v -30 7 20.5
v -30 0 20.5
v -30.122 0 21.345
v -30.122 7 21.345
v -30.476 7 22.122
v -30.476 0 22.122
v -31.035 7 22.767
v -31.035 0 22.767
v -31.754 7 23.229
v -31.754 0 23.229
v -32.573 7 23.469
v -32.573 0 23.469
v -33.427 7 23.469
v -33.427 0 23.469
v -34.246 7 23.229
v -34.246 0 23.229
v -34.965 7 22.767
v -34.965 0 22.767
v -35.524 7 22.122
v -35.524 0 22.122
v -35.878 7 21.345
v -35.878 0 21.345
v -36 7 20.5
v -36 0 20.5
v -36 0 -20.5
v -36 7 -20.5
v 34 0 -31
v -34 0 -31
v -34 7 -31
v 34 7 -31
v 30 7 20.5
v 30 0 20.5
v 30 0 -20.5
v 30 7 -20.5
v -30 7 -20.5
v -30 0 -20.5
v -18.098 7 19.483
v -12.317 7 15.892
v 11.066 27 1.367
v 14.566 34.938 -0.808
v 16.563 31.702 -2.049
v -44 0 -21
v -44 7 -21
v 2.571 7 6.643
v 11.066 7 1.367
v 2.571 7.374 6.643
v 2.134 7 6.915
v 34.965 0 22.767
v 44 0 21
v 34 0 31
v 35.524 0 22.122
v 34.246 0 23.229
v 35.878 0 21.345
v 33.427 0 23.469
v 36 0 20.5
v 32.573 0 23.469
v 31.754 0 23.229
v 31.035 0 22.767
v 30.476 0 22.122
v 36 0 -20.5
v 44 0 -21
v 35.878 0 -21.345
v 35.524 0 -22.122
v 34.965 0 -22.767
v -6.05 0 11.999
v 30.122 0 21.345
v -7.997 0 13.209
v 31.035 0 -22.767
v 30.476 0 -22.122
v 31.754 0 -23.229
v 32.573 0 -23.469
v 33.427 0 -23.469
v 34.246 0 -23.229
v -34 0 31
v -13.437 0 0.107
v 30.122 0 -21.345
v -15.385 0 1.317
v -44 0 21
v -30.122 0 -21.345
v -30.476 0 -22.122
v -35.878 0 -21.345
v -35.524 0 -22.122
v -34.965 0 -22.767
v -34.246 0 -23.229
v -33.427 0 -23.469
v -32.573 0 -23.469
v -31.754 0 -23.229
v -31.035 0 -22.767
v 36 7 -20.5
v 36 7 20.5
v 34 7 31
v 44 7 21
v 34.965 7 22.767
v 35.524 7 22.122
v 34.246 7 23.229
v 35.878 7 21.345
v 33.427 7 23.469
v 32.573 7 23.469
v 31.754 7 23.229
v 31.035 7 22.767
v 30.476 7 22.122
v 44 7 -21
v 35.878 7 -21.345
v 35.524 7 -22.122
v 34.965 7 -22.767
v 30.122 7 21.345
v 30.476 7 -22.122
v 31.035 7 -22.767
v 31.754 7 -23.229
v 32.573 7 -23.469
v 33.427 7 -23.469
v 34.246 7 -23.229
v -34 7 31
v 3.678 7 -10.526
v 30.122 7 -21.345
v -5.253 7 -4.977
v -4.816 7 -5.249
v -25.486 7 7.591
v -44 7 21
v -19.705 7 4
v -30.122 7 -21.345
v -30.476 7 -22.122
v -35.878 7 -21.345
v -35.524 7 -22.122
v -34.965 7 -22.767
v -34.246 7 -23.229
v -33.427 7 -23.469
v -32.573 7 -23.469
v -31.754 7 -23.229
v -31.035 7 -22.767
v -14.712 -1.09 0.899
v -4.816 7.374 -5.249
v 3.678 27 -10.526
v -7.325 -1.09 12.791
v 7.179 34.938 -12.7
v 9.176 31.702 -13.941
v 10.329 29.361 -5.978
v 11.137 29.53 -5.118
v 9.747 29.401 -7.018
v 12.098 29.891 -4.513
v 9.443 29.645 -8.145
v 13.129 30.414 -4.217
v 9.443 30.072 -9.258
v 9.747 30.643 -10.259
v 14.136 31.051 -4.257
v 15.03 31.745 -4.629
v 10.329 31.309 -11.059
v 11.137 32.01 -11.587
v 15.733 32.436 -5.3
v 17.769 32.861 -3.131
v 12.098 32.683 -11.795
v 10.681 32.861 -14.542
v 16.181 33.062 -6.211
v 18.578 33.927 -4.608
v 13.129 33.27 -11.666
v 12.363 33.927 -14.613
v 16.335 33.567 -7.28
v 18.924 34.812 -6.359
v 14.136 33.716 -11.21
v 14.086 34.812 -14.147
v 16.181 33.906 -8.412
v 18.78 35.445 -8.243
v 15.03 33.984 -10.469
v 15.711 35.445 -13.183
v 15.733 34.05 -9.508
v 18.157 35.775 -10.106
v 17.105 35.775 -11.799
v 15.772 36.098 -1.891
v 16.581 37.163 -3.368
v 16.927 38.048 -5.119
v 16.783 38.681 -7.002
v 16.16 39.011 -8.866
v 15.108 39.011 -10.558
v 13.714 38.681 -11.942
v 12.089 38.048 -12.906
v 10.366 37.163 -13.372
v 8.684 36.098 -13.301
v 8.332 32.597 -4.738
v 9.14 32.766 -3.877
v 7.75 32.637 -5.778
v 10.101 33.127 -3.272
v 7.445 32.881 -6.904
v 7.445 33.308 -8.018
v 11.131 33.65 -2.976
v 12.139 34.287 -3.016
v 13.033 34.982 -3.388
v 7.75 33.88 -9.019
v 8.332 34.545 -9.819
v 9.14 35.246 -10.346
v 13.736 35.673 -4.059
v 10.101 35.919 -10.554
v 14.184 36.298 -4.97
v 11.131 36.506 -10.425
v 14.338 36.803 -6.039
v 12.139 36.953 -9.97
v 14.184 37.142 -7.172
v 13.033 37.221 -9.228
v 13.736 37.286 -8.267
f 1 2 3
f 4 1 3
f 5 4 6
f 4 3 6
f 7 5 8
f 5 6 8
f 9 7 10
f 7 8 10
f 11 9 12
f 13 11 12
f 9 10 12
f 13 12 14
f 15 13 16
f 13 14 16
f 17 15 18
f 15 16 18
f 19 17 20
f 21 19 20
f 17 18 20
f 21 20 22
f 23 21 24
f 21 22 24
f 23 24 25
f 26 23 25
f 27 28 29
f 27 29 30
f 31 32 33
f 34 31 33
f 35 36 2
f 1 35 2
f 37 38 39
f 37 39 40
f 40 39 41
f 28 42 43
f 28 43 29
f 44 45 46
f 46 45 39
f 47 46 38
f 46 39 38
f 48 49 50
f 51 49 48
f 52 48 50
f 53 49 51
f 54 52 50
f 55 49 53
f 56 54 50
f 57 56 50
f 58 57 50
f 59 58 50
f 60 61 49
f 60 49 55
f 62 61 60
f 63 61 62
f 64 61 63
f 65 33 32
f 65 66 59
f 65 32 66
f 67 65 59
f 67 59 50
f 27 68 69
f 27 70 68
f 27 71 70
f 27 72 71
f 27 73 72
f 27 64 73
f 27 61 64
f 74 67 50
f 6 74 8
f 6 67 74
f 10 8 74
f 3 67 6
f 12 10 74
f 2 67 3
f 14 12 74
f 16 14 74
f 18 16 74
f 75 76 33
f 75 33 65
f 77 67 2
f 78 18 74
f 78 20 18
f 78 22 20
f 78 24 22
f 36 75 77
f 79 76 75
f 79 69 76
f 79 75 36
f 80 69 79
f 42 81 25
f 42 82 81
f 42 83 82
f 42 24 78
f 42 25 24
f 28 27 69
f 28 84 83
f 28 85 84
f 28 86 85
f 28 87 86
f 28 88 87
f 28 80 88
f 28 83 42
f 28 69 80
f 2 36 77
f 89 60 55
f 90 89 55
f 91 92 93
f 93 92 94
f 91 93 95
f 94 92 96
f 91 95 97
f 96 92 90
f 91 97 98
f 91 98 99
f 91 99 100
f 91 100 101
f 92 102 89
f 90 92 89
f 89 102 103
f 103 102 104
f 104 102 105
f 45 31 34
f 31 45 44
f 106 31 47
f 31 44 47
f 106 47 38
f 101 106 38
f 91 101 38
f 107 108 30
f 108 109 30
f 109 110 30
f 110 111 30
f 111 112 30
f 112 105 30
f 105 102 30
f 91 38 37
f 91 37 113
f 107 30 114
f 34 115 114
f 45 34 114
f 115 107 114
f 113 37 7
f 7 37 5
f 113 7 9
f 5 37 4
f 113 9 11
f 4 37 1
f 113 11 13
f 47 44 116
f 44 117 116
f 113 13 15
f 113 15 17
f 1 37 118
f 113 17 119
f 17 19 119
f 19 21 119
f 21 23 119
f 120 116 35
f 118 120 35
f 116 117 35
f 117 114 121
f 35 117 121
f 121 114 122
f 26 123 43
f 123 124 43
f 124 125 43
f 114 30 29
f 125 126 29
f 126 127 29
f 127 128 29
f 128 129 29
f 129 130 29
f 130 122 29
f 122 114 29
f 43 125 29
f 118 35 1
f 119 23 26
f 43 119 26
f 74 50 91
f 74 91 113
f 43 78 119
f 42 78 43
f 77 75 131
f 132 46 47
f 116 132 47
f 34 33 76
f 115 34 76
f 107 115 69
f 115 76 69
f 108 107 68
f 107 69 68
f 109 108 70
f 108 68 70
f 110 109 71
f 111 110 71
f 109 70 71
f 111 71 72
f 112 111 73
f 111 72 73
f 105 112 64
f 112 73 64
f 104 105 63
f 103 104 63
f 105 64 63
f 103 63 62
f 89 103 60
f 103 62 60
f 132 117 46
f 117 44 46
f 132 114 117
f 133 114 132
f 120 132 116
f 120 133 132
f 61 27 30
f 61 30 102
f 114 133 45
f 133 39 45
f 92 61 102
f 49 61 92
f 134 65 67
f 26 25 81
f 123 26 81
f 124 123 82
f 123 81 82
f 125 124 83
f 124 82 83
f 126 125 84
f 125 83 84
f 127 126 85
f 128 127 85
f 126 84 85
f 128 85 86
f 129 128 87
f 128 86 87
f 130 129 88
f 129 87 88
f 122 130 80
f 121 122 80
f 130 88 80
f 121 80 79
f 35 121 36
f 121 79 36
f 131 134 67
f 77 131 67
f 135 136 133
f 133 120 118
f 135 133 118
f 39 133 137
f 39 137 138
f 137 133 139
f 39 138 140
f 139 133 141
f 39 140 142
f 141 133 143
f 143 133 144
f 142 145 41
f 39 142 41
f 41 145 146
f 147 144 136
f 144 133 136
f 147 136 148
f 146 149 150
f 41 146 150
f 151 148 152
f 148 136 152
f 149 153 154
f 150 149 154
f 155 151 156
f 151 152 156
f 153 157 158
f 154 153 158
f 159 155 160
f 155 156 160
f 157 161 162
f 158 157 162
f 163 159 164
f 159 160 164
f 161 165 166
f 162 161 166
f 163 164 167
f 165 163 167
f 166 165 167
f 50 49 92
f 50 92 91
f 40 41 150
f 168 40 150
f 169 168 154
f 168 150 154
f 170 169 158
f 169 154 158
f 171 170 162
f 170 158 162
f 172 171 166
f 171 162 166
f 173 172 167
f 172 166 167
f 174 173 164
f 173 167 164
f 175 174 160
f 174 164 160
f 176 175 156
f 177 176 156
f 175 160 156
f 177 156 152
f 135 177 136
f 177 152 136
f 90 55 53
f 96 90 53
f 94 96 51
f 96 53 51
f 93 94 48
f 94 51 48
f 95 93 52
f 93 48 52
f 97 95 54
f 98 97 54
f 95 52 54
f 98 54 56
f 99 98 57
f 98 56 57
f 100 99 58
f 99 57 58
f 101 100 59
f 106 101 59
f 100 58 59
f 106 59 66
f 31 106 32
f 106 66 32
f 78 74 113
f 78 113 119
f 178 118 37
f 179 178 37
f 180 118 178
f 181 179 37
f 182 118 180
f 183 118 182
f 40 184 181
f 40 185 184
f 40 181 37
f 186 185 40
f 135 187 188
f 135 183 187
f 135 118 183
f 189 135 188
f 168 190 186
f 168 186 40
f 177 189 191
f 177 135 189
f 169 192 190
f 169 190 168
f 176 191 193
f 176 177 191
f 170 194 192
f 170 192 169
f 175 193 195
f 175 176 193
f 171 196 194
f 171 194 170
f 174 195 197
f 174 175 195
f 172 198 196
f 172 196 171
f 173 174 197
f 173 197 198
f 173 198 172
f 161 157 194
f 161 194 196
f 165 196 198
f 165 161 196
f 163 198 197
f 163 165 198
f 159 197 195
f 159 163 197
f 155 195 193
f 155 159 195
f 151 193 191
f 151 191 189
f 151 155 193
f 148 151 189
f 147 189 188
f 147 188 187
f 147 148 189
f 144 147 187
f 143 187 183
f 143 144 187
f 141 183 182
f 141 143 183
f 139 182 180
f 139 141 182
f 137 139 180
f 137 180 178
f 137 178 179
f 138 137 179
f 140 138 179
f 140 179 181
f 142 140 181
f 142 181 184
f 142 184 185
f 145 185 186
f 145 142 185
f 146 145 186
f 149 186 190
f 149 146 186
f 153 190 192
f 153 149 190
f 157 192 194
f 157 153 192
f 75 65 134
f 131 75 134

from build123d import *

# Parameters (mm, degrees)
BOSS_EXTRUDE1_DEPTH = 7
EXTRUDE_THIN1_DEPTH = 7
SKETCH4_R           = 4
BOSS_EXTRUDE2_DEPTH = 4


with BuildPart() as part:
    # Sketch1 → Boss-Extrude1 (new body)
    with BuildSketch(Plane(origin=(0, 0, 0), x_dir=(1, 0, 0), z_dir=(0, 1, 0))):
        Polygon((34, 31), (44, 21), (44, -21), (34, -31), (-34, -31), (-44, -21), (-44, 21), (-34, 31), align=None)
        with BuildLine():
            Line((-30, 20.5), (-30, -20.5))
            ThreePointArc((-30, -20.5), (-33, -23.5), (-36, -20.5))
            Line((-36, -20.5), (-36, 20.5))
            ThreePointArc((-36, 20.5), (-33, 23.5), (-30, 20.5))
        make_face(mode=Mode.SUBTRACT)
        with BuildLine():
            Line((36, 20.5), (36, -20.5))
            ThreePointArc((36, -20.5), (33, -23.5), (30, -20.5))
            Line((30, -20.5), (30, 20.5))
            ThreePointArc((30, 20.5), (33, 23.5), (36, 20.5))
        make_face(mode=Mode.SUBTRACT)
    extrude(amount=BOSS_EXTRUDE1_DEPTH)

    # Sketch3 → Extrude-Thin1 (add, symmetric)
    with BuildSketch(Plane(origin=(0, 0, 0), x_dir=(0.849441251, 0, -0.527683201), z_dir=(0.527683201, 0, 0.849441251))):
        Polygon((-18.849066913, 7), (8.678571497, 27), (8.678571497, 7), (-1.321428503, 7), (-1.321428503, 7.373894945), (-12.97121439, -1.090169944), align=None)
    extrude(amount=EXTRUDE_THIN1_DEPTH, both=True)

    # Sketch4 → Boss-Extrude2 (add)
    with BuildSketch(Plane(origin=(-8.359258135, 13.544823437, 5.192872478), x_dir=(0.866435488, 0.466201263, 0.178734239), z_dir=(-0.49928904, 0.809016994, 0.310164404))):
        with BuildLine():
            Line((20.238219538, 24.365708041), (-17.853578159, -4.883475366))
            Line((-17.853578159, -4.883475366), (-9.327190536, -15.987560835))
            Line((-9.327190536, -15.987560835), (28.764607161, 13.261622572))
            ThreePointArc((28.764607161, 13.261622572), (30.053456084, 23.076859118), (20.238219538, 24.365708041))
        make_face()
        with Locations((24.501413349, 18.813665306)):
            Circle(SKETCH4_R, mode=Mode.SUBTRACT)
    extrude(amount=BOSS_EXTRUDE2_DEPTH)


solid = part.part
